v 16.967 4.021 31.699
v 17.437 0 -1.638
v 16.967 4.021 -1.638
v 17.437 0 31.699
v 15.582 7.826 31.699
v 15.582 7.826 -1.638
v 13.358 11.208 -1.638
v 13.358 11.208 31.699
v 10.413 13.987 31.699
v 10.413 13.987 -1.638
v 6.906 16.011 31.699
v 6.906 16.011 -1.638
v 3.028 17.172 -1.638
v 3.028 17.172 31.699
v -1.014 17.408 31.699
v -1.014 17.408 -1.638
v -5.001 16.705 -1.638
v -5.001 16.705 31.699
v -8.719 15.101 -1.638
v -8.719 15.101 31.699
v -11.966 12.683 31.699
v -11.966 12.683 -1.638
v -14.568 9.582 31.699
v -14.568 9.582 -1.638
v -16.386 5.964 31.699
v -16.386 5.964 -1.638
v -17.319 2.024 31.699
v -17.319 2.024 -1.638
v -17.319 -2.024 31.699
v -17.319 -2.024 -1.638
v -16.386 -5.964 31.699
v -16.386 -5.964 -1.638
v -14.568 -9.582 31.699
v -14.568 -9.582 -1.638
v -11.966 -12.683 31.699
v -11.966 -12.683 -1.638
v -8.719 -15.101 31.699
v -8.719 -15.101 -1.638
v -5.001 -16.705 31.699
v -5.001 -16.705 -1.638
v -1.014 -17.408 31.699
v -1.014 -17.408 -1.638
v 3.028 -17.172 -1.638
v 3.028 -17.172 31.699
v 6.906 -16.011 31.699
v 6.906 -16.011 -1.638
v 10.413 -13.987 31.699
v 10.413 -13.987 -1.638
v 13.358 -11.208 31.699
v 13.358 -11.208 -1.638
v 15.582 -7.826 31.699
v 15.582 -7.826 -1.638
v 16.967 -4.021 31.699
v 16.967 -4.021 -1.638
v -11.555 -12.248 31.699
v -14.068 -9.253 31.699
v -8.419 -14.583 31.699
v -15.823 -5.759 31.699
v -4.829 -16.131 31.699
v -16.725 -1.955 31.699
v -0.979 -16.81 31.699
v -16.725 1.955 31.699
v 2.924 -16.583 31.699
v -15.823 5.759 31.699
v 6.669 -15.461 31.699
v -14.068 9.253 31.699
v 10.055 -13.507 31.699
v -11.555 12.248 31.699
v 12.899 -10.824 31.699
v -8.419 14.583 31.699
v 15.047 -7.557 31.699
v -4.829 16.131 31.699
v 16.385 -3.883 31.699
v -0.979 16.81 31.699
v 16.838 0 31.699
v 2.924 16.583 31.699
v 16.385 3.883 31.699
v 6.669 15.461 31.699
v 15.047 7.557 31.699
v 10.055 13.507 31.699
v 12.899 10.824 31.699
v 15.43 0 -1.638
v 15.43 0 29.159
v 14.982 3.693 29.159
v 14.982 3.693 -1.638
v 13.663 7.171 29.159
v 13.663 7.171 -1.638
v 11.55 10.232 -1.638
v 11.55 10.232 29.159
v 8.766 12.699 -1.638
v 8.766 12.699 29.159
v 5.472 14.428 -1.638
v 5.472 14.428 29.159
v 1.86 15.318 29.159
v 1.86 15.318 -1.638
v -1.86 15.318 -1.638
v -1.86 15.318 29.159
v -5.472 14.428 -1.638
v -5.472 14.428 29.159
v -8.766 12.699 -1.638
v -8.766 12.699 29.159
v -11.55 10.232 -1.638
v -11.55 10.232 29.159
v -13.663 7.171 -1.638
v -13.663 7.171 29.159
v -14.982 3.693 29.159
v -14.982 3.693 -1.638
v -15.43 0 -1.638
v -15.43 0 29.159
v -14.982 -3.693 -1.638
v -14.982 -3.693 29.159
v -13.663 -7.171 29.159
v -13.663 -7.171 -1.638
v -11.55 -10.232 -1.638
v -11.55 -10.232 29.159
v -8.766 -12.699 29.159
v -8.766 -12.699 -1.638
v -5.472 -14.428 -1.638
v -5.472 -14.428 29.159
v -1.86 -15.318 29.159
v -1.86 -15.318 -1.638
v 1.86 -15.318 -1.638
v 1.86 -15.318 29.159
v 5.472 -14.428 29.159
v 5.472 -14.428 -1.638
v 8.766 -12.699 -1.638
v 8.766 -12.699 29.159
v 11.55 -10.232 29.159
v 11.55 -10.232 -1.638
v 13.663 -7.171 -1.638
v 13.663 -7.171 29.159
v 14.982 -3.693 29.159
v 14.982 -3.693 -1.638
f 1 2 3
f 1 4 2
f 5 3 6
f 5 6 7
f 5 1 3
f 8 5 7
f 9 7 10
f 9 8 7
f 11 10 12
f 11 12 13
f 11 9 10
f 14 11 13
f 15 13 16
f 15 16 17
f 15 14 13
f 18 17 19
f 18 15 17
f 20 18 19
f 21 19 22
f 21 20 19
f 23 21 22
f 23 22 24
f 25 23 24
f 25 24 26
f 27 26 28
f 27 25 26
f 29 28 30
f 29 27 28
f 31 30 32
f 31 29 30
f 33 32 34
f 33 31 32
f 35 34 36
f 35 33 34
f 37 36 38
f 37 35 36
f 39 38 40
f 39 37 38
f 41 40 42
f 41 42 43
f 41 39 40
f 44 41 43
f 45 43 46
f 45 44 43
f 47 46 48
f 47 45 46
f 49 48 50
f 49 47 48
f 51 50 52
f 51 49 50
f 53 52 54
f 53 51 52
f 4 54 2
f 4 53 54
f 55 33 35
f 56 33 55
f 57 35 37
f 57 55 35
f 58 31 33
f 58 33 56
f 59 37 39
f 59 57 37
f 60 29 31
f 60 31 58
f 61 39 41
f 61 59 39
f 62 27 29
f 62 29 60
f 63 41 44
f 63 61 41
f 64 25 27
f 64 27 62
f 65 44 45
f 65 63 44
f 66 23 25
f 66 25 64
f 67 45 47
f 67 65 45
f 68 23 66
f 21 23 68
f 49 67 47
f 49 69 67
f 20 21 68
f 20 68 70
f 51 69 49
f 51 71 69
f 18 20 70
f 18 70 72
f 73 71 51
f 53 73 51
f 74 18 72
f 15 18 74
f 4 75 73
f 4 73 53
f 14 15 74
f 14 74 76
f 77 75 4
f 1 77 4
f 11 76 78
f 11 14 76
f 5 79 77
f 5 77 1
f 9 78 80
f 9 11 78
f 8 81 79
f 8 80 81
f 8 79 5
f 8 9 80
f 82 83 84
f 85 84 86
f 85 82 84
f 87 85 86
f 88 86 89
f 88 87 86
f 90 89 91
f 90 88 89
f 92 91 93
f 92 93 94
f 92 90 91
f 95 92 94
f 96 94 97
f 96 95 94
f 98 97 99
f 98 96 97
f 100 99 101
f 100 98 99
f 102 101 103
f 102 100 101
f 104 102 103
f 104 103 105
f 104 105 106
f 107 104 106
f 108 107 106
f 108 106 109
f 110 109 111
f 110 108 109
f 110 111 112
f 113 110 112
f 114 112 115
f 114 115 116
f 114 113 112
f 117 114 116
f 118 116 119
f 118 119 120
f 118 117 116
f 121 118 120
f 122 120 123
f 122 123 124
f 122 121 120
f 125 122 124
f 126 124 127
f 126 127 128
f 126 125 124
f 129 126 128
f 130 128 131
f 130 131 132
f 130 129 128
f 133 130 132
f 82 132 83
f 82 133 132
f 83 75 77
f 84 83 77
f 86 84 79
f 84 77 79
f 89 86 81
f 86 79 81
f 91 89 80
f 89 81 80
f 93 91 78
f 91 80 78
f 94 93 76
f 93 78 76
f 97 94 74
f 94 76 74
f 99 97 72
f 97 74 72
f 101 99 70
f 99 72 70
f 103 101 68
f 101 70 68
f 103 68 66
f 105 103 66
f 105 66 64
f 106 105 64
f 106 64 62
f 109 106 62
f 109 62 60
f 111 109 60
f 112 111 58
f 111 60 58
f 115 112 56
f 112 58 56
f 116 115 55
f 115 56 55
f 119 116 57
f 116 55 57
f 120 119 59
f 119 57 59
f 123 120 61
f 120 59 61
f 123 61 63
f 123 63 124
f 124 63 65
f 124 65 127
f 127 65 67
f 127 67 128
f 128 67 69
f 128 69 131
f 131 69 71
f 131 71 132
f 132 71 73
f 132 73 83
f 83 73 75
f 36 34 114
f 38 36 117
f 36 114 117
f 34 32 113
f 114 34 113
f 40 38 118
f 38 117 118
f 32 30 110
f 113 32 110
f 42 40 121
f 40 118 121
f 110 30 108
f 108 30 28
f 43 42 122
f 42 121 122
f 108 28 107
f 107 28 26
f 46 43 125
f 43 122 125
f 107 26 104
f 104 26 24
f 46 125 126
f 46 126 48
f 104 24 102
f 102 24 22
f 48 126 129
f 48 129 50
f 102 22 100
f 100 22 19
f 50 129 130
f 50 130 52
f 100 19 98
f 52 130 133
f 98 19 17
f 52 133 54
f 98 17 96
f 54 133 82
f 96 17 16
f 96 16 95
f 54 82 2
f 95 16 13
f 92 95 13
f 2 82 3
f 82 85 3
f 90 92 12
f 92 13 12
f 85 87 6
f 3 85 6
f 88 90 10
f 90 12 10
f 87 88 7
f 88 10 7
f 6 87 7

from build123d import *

# Parameters (mm, degrees)
F0_R     = 17.4371
F0_R_2   = 16.8275
F0_R_3   = 15.4305
F1_DEPTH = 31.6992
F2_DEPTH = 1.6383
F3_SIZE2 = 1.4079449907
F3_SIZE  = 2.54


with BuildPart() as f1:
    # F0 (on Top) → F1 (new body)
    with BuildSketch(Plane.XY):
        Circle(F0_R)
        Circle(F0_R_2, mode=Mode.SUBTRACT)
        Circle(F0_R_2)
        Circle(F0_R_3, mode=Mode.SUBTRACT)
    extrude(amount=F1_DEPTH)

    # F0 (on Top) → F2 (join)
    with BuildSketch(Plane.XY):
        Circle(F0_R)
        Circle(F0_R_2, mode=Mode.SUBTRACT)
        Circle(F0_R_2)
        Circle(F0_R_3, mode=Mode.SUBTRACT)
    extrude(amount=-F2_DEPTH)

    # F3
    f3_edges = [f1.edges().sort_by_distance(p)[0] for p in [
        (-15.4305, 0, 31.6992),
    ]]
    f3_side = f1.faces().sort_by_distance((-15.4305, 0, 15.8496))[0]
    chamfer(f3_edges, length=F3_SIZE, length2=F3_SIZE2, reference=f3_side)


solid = f1.part
